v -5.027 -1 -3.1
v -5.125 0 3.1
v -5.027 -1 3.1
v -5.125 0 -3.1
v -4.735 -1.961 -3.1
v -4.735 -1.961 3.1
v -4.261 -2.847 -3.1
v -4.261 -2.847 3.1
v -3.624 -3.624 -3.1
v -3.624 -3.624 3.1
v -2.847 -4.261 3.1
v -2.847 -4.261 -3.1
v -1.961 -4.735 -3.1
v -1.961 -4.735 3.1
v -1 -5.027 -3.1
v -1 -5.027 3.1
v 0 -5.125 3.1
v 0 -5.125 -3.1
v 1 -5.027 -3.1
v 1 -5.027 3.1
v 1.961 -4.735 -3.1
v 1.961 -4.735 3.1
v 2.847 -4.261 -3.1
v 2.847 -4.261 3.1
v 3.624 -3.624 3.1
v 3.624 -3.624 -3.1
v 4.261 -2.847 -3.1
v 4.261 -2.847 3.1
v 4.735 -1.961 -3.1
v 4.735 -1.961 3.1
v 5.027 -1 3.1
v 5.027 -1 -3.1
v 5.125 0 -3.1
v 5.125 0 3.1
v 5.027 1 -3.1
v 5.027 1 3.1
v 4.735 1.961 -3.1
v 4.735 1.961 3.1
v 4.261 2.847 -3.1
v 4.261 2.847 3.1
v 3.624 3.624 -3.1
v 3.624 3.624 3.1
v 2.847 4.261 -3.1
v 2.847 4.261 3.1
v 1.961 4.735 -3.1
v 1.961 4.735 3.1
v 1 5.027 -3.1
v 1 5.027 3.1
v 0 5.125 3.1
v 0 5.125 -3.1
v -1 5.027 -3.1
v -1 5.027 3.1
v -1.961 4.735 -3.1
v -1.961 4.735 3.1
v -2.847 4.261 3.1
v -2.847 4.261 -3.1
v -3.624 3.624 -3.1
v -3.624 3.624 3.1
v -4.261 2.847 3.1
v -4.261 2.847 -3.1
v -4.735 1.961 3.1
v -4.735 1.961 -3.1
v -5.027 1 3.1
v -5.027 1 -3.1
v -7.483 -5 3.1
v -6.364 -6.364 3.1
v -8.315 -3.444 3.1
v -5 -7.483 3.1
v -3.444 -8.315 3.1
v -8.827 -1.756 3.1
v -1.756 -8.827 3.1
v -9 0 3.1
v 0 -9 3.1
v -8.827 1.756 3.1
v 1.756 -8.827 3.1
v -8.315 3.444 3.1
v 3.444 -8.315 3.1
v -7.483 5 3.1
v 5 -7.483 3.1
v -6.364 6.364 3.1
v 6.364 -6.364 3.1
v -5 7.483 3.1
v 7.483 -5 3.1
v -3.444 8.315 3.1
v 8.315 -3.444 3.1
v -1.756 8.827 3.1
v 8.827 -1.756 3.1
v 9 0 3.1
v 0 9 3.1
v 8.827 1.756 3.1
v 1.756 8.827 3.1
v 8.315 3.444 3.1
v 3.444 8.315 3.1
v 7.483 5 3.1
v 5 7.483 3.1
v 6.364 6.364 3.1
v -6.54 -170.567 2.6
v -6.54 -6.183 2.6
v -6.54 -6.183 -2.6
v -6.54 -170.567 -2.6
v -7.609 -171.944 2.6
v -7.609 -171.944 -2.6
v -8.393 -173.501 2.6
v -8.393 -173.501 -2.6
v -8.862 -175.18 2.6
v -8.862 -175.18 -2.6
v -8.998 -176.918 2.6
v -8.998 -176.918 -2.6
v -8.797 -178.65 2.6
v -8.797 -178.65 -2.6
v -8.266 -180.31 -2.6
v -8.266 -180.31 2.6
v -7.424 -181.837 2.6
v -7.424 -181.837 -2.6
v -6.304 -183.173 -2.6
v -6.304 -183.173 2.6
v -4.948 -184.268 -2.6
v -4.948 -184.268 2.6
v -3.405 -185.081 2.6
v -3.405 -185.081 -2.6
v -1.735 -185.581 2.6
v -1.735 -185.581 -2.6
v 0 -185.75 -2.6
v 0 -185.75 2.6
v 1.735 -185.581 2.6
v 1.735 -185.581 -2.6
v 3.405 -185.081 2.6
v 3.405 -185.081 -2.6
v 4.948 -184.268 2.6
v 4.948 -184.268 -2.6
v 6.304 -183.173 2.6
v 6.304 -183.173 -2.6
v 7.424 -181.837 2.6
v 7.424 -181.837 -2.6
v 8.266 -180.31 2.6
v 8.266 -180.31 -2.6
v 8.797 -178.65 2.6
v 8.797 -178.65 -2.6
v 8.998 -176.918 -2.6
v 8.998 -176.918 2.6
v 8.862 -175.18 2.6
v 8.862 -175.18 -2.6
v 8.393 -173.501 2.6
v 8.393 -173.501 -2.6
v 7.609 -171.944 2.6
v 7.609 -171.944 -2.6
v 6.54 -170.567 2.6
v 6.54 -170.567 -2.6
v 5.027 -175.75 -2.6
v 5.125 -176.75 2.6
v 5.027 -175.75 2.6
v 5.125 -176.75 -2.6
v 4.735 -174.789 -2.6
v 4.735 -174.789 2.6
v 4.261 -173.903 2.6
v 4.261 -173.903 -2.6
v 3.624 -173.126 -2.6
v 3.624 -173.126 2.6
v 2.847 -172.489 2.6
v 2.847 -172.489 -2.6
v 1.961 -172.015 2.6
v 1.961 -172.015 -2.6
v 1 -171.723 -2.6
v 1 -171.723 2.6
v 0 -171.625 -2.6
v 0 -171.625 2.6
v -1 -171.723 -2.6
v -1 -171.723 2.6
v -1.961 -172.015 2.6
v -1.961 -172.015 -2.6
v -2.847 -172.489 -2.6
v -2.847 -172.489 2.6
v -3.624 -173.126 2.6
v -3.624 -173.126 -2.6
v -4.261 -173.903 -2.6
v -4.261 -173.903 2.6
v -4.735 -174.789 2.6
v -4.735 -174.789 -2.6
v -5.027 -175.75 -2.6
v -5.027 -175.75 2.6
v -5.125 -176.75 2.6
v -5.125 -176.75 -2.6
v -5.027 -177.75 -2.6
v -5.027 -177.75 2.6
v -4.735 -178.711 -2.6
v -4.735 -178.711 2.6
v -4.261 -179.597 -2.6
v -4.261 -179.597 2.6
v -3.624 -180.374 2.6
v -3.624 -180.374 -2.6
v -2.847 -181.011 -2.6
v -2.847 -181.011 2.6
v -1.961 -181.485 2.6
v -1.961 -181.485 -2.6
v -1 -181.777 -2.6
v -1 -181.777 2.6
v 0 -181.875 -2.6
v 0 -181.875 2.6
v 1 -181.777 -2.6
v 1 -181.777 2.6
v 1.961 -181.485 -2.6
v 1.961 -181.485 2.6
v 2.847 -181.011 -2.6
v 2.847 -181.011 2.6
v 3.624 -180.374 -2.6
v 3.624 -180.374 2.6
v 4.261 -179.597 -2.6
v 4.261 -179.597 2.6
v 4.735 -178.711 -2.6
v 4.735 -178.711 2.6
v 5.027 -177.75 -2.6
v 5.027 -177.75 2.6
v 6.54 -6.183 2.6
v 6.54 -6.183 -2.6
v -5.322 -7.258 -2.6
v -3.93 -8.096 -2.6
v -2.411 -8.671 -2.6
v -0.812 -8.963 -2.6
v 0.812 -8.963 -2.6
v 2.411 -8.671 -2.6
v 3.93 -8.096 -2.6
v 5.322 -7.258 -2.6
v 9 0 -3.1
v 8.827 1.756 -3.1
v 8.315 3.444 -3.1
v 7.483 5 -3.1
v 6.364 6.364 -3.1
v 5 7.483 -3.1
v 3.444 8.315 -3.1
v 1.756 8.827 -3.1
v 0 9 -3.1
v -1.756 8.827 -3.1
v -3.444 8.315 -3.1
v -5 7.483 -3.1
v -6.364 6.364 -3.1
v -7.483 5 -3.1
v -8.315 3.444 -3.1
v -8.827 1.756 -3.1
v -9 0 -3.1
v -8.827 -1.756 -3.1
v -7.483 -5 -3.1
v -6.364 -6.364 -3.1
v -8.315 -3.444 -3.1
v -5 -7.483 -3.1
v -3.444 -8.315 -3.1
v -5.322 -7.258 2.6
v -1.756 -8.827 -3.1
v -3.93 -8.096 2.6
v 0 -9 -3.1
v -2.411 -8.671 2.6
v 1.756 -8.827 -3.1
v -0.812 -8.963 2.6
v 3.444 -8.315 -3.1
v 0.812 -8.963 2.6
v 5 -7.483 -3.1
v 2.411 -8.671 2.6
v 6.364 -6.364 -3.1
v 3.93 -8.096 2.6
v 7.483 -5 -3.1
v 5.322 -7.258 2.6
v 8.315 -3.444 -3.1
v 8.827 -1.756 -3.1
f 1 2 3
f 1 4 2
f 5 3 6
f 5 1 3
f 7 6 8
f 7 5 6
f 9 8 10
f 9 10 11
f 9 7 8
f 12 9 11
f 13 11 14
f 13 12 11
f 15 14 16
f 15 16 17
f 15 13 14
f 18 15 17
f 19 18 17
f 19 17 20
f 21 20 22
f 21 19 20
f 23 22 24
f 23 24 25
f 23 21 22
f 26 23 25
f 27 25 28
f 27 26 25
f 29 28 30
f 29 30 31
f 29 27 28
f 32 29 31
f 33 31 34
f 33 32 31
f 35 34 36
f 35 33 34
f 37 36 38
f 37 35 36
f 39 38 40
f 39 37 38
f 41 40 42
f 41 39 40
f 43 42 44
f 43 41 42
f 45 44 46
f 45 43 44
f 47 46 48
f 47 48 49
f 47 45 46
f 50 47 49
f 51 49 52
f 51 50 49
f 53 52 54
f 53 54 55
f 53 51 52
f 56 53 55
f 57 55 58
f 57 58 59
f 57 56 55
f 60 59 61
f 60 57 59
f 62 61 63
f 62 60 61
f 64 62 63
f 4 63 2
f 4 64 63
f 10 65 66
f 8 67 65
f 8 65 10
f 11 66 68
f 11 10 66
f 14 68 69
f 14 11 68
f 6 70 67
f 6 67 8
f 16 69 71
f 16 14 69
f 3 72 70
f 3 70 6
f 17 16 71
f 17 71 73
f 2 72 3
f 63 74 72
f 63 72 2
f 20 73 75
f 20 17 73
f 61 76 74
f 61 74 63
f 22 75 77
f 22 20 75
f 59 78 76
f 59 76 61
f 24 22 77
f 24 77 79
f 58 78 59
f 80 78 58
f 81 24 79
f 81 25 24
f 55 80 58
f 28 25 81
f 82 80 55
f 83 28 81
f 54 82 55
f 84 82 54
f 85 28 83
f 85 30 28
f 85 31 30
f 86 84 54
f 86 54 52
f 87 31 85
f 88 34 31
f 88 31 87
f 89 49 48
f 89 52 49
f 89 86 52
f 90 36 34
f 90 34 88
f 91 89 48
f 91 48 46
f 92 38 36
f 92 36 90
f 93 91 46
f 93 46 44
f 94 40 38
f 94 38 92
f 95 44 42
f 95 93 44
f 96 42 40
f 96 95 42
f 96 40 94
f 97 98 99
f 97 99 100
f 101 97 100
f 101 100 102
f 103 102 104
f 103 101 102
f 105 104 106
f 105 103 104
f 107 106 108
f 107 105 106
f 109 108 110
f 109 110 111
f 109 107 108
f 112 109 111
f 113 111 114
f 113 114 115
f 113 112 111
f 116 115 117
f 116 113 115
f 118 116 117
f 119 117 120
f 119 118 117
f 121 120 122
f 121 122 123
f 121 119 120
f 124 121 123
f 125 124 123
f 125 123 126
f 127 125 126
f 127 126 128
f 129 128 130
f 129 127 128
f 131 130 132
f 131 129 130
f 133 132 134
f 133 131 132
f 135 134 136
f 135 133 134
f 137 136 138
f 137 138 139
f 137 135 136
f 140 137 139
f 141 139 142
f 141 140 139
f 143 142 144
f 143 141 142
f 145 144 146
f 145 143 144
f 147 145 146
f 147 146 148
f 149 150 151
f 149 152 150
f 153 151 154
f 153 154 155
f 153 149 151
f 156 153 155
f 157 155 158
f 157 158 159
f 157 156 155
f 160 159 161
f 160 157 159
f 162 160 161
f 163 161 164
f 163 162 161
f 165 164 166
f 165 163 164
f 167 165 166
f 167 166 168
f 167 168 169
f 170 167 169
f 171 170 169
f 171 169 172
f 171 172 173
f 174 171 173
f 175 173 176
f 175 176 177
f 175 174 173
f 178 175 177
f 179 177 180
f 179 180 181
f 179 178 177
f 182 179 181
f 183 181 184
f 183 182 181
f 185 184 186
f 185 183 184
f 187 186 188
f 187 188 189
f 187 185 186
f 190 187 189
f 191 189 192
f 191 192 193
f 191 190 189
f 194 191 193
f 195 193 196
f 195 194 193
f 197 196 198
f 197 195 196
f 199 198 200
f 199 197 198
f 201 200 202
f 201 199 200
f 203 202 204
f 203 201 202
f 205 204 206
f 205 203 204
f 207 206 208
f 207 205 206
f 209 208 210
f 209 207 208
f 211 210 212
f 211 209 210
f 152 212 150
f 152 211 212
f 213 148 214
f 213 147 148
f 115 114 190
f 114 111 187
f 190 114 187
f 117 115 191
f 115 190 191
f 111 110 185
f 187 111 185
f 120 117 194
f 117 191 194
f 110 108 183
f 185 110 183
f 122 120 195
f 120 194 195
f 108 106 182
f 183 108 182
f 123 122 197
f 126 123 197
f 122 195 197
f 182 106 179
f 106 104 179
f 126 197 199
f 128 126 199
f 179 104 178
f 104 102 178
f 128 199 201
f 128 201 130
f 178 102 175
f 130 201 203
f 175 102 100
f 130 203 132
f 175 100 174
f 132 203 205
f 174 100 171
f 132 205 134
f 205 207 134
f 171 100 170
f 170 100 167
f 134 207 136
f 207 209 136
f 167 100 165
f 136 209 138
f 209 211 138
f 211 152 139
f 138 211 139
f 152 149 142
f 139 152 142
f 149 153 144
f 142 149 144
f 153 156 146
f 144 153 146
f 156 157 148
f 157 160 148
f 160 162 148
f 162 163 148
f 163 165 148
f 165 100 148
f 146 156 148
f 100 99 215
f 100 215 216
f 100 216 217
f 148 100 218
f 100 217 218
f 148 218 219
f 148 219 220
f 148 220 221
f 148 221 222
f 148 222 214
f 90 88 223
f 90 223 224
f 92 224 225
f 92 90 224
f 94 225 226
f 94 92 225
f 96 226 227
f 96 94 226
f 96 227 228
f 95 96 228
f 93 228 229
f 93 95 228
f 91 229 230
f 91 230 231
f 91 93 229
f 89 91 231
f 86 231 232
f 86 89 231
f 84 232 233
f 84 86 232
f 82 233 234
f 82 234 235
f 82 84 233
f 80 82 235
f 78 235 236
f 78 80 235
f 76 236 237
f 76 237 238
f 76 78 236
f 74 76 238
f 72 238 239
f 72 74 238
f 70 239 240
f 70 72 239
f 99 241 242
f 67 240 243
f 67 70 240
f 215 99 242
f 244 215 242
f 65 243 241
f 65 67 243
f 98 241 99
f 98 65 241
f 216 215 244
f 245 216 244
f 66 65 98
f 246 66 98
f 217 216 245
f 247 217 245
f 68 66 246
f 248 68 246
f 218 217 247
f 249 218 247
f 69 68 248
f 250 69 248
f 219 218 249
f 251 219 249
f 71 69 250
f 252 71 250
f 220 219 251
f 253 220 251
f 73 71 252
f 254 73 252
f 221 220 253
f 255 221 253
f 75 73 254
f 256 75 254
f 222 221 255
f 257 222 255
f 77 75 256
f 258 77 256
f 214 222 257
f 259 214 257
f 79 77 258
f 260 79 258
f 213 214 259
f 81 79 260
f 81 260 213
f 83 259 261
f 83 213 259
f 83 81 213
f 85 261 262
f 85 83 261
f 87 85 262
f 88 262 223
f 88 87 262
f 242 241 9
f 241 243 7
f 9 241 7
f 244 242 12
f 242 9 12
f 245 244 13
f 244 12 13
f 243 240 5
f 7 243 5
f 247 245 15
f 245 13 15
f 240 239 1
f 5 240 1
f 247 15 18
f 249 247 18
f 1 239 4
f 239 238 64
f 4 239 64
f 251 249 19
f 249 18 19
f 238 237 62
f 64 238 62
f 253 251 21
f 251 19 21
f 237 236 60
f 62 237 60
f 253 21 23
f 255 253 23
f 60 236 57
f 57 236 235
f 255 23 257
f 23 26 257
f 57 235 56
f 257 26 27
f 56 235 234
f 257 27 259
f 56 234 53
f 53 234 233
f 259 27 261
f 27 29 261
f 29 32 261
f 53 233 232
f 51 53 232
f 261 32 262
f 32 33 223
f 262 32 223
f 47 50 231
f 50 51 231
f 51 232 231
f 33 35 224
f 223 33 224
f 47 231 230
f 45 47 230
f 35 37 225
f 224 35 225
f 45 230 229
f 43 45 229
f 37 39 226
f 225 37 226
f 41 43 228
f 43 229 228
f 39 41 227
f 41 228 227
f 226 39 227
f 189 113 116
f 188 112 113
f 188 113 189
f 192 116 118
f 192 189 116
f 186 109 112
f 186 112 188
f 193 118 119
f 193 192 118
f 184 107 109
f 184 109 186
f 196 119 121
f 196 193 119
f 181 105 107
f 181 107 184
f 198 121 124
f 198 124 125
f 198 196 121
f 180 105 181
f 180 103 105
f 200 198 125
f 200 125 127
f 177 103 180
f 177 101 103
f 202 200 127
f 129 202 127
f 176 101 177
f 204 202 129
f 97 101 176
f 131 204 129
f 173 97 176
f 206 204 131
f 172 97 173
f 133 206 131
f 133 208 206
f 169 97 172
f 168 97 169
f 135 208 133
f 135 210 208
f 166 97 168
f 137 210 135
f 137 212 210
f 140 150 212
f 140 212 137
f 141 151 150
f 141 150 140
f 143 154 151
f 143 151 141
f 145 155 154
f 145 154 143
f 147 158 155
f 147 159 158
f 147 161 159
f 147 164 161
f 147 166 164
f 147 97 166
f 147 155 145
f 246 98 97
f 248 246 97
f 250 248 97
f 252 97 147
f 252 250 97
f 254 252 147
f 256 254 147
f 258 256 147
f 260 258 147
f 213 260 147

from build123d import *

# Parameters (mm, degrees)
CROQUIS1_R              = 5.125
SALIENTE_EXTRUIR1_DEPTH = 2.6
CROQUIS1_3_R            = 9
CROQUIS1_3_R_2          = 5.125
SALIENTE_EXTRUIR2_DEPTH = 3.1


with BuildPart() as part:
    # Croquis1 → Saliente-Extruir1 (new, symmetric)
    with BuildSketch(Plane.XY):
        with BuildLine():
            ThreePointArc((6.54, -6.182911935), (0, -9), (-6.54, -6.182911935))
            Line((-6.54, -6.182911935), (-6.54, -170.567088065))
            ThreePointArc((-6.54, -170.567088065), (0, -185.75), (6.54, -170.567088065))
            Line((6.54, -170.567088065), (6.54, -6.182911935))
        make_face()
        with Locations((0, -176.75)):
            Circle(CROQUIS1_R, mode=Mode.SUBTRACT)
    extrude(amount=SALIENTE_EXTRUIR1_DEPTH, both=True)

    # Croquis1<3> → Saliente-Extruir2 (add, symmetric)
    with BuildSketch(Plane.XY):
        Circle(CROQUIS1_3_R)
        with Locations(Location((0, 0, 0), (0, 0, 180))):
            Circle(CROQUIS1_3_R_2, mode=Mode.SUBTRACT)
    extrude(amount=SALIENTE_EXTRUIR2_DEPTH, both=True)


solid = part.part
